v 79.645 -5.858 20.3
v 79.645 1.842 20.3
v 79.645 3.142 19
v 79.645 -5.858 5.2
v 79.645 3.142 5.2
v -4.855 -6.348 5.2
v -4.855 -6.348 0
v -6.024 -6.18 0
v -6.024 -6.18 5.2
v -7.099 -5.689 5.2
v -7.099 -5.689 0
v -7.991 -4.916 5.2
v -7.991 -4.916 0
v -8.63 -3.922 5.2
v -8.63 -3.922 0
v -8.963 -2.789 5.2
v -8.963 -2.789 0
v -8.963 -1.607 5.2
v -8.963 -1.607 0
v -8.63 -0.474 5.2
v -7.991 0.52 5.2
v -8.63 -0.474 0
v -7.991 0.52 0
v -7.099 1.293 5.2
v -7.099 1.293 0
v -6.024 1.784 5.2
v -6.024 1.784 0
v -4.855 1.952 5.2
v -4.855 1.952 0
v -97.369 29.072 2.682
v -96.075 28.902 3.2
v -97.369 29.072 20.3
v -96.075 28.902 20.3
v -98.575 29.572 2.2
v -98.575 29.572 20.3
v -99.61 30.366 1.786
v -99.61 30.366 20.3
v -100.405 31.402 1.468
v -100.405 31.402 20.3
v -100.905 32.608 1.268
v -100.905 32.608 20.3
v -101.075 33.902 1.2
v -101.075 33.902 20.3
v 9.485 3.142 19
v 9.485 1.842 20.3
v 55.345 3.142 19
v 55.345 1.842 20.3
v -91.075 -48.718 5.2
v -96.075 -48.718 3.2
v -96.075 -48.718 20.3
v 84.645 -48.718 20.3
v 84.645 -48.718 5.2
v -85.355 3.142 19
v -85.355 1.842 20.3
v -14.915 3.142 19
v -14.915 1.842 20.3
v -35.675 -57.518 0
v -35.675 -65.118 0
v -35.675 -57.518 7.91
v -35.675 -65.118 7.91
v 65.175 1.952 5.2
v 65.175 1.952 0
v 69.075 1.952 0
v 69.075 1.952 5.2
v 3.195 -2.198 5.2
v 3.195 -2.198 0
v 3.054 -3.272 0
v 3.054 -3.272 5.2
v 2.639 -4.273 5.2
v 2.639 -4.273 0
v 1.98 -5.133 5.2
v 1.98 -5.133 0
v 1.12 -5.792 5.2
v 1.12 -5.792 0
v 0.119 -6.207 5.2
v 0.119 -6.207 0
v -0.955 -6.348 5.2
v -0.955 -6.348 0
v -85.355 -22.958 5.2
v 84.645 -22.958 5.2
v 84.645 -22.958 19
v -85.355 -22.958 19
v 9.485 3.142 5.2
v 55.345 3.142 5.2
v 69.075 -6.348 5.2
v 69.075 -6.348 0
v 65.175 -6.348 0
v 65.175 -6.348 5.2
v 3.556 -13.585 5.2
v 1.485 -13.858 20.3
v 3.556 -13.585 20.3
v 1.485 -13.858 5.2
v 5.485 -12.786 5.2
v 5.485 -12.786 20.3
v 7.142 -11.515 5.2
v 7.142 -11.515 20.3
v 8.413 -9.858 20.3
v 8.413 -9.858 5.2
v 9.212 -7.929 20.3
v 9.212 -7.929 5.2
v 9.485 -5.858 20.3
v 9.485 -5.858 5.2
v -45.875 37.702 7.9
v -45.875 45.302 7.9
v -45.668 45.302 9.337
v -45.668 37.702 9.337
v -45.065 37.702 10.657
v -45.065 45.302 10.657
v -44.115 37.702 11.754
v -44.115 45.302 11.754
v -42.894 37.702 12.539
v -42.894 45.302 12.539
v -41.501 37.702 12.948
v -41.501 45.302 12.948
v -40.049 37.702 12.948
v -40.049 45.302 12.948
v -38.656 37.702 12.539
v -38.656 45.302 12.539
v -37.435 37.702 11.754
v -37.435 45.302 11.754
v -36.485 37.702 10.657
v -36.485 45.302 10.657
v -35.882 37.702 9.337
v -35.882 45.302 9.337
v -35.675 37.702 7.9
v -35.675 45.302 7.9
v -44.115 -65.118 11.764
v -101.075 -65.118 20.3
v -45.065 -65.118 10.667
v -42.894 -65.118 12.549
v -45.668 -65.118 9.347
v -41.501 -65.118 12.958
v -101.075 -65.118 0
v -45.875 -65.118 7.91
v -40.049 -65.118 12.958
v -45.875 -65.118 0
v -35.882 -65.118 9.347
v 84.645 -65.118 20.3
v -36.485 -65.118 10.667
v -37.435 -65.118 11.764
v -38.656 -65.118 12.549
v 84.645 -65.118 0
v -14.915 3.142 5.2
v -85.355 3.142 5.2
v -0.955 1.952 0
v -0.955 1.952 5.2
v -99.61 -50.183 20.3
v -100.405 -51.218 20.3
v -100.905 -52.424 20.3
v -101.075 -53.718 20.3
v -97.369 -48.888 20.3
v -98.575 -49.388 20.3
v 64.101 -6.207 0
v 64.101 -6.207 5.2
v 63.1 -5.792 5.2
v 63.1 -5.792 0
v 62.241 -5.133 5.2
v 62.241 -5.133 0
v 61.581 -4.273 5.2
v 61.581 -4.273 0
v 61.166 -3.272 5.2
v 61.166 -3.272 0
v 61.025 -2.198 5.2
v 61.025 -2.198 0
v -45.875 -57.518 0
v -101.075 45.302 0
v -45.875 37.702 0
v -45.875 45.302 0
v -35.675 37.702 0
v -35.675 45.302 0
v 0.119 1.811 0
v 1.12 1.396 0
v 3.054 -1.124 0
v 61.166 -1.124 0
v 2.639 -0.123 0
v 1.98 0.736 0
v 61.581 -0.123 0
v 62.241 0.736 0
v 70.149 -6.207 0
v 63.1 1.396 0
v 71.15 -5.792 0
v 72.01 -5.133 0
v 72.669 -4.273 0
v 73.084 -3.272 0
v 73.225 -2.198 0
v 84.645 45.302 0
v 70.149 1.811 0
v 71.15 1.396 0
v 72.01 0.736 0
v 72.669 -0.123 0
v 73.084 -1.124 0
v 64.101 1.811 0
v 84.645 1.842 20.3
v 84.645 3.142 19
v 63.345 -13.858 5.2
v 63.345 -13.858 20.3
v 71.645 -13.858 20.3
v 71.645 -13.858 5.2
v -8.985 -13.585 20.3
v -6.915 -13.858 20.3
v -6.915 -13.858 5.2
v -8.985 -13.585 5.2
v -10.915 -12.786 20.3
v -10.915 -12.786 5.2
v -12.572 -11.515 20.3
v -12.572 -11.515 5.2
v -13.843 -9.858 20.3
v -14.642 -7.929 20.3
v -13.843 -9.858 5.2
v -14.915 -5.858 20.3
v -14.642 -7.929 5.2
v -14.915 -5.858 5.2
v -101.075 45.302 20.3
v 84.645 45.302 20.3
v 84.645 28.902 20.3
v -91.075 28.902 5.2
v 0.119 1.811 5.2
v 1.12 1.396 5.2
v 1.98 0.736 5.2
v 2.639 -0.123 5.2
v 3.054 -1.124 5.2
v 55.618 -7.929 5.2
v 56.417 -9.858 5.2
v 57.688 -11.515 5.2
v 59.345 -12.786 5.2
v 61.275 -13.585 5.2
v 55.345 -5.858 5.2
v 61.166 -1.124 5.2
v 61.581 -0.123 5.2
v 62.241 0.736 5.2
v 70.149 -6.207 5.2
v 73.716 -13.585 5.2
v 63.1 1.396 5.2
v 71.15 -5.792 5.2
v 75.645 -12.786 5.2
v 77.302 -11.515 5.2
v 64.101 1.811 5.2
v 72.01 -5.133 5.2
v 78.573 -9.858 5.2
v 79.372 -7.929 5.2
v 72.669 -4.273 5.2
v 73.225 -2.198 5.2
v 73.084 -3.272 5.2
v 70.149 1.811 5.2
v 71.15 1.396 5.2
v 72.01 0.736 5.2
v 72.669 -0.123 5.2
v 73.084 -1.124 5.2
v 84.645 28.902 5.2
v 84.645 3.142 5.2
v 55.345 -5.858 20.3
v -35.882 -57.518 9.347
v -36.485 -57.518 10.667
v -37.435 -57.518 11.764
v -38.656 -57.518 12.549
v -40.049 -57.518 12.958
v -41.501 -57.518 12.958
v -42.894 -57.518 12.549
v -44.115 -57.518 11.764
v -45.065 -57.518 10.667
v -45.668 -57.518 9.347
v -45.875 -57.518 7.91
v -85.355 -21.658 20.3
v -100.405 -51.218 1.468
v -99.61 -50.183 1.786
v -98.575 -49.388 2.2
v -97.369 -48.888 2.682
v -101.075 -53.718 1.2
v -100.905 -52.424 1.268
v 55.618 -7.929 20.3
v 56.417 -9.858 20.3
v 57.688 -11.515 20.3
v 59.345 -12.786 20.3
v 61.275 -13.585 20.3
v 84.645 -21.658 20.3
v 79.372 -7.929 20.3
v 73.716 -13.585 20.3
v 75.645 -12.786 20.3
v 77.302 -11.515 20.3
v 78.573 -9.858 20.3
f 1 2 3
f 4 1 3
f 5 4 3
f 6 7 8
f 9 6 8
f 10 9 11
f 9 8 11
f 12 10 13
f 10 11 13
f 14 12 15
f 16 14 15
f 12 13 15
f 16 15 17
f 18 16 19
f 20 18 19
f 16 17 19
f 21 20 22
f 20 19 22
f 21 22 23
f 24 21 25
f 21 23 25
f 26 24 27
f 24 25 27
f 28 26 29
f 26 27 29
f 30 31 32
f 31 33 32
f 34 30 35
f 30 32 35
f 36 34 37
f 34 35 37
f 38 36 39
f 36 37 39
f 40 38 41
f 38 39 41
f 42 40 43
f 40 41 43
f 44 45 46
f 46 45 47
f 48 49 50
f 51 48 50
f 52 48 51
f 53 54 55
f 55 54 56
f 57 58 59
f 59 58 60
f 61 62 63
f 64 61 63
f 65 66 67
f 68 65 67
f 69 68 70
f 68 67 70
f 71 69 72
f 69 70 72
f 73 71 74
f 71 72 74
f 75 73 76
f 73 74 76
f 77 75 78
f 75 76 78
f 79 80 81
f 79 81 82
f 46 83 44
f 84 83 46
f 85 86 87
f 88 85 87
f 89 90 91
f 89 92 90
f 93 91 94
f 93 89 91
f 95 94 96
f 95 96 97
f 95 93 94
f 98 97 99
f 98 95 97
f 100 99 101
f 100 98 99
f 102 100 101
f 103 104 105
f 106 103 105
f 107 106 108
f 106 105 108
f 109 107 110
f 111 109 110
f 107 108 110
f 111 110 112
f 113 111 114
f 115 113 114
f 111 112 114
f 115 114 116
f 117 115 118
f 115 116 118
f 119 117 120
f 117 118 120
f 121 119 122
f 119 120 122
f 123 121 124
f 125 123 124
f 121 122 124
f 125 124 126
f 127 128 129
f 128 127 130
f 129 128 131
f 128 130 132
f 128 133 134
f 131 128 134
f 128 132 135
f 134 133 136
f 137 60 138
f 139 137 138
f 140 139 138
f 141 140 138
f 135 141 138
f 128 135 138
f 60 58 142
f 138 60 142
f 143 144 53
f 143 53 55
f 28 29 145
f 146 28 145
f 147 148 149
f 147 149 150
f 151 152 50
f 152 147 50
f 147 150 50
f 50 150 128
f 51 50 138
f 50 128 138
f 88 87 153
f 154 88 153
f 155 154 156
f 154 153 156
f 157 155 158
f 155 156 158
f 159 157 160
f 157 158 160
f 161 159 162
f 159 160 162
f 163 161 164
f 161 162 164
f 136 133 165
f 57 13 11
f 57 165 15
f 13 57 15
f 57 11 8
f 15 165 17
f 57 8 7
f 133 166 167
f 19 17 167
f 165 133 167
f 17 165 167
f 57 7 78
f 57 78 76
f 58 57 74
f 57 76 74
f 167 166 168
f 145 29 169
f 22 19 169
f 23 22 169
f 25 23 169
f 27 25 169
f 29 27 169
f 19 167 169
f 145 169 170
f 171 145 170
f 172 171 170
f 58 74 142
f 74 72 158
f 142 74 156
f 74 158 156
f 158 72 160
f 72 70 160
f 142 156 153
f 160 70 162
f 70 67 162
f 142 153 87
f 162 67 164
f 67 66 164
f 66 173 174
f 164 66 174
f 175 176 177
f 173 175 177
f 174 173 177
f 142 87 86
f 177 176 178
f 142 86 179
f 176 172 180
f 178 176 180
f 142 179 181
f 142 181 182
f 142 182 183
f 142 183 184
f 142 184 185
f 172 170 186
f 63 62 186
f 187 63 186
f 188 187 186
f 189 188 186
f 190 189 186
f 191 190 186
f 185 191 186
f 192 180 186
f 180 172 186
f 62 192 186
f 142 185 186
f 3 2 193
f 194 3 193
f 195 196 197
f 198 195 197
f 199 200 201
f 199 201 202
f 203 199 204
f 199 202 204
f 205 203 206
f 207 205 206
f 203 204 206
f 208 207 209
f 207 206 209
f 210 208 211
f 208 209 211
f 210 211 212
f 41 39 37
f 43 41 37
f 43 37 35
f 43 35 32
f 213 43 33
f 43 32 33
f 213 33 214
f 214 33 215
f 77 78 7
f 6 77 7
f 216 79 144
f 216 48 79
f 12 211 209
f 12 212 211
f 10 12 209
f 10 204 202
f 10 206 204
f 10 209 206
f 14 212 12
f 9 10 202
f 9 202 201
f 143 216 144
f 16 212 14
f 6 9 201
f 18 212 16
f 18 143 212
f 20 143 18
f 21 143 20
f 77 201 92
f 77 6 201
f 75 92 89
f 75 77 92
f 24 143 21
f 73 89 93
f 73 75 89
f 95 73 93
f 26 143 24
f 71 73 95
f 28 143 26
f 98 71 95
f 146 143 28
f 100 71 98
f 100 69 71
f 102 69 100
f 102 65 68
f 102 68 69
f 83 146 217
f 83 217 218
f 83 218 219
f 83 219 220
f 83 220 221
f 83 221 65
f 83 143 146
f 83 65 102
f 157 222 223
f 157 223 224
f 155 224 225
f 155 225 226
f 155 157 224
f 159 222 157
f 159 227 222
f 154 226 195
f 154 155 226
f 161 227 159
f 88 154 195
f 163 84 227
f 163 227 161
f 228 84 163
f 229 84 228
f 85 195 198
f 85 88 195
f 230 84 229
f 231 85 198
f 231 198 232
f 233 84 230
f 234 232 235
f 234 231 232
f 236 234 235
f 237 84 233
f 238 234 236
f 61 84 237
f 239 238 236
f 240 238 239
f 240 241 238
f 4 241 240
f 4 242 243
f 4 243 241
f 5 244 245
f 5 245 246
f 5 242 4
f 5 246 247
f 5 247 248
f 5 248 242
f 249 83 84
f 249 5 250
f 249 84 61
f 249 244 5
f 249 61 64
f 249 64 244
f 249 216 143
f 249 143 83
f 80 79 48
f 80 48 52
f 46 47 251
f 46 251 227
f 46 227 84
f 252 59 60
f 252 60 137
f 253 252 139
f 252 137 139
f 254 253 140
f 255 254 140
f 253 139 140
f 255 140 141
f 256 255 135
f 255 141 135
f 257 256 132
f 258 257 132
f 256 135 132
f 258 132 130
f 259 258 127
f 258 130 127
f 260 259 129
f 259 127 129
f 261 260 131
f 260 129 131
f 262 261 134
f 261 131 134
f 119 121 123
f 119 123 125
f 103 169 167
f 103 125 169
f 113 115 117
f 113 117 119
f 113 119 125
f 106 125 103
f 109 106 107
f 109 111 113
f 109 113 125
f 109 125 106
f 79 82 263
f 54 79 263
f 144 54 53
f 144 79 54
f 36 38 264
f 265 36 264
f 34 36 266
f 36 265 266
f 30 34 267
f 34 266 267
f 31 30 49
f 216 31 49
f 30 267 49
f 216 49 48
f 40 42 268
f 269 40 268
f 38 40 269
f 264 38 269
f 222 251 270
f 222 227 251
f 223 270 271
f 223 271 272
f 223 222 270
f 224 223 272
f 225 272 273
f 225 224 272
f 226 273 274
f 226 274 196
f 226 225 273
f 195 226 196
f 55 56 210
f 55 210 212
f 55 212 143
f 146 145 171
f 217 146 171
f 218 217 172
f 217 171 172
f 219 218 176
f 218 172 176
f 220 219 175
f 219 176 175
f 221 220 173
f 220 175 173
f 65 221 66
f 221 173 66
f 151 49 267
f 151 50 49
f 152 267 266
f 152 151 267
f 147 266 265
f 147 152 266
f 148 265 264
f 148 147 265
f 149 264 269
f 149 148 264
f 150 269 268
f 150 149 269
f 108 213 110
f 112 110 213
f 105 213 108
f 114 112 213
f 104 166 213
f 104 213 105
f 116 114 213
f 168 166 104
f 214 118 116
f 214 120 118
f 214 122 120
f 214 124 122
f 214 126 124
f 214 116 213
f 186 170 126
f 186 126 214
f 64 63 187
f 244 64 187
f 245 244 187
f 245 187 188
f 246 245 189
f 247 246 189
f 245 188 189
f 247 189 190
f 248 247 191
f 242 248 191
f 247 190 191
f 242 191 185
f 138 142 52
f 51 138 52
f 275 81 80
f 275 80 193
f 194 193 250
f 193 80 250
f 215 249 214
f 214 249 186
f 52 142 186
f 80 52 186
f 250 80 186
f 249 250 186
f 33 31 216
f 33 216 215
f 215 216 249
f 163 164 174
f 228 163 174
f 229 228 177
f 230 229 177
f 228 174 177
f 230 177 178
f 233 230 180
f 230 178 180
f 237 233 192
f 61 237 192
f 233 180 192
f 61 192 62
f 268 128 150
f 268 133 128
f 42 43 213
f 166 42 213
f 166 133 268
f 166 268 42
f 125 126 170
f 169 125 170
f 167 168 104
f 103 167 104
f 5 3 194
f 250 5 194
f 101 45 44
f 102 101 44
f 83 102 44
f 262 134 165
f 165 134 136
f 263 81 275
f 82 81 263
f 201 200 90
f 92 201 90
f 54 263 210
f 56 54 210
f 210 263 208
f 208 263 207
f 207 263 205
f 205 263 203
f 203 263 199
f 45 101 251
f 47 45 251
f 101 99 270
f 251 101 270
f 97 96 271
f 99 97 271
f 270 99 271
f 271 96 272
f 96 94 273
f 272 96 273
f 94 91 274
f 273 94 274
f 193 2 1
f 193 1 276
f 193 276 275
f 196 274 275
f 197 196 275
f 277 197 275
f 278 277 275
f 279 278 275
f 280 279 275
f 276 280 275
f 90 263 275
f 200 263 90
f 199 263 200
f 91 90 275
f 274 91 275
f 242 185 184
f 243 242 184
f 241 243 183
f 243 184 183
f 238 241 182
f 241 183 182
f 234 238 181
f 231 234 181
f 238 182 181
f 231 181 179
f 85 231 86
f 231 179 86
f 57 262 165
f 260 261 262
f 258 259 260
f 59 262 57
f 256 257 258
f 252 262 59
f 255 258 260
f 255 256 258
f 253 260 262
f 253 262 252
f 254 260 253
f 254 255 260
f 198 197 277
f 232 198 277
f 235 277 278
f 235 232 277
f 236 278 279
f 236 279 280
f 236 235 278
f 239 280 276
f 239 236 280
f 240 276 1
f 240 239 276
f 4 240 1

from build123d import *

# Parameters (mm, degrees)
F0_W      = 185.72
F0_H      = 110.42
F1_DEPTH  = 5.2
F3_DEPTH  = 110.42
F4_W      = 185.72
F4_H      = 16.4
F5_DEPTH  = 20.3
F6_W      = 24.4
F6_H      = 17
F6_W_2    = 24.3
F7_DEPTH  = 15.1
F8_R      = 8
F9_R      = 8
F10_R     = 5
F11_SIZE  = 1.3
F14_DEPTH = 7.6
F16_DEPTH = 7.6
F17_DEPTH = 20.301


with BuildPart() as f1:
    # F0 (on Top) → F1 (new body)
    with BuildSketch(Plane.XY):
        with Locations((-8.2149282098, -9.908063139)):
            Rectangle(F0_W, F0_H)
    extrude(amount=F1_DEPTH)

    # F2 (on face) → F3 (cut, through all)
    with BuildSketch(Plane.XZ.offset(65.118063139)):
        Polygon((-91.0749282098, 5.2), (-101.0749282098, 5.2), (-101.0749282098, 1.2), align=None)
    extrude(amount=-F3_DEPTH, mode=Mode.SUBTRACT)

    # F4 (on face) → F5 (join)
    with BuildSketch(Plane(origin=(0, 0, 0), x_dir=(1, 0, 0), z_dir=(0, 0, -1))):
        with Locations((-8.2149282098, 56.918063139)):
            Rectangle(F4_W, F4_H)
        with Locations((-8.2149282098, -37.101936861)):
            Rectangle(F4_W, F4_H)
        Polygon((84.6450717902, 9.908063139), (84.6450717902, 22.958063139), (-85.3549282098, 22.958063139), (-85.3549282098, 9.908063139), (-85.3549282098, -3.141936861), (84.6450717902, -3.141936861), align=None)
    extrude(amount=-F5_DEPTH)

    # F6 (on face) → F7 (cut)
    with BuildSketch(Plane.XY.offset(20.3)):
        with Locations((-2.7149282098, -5.358063139)):
            Rectangle(F6_W, F6_H)
        with Locations((67.4950717902, -5.358063139)):
            Rectangle(F6_W_2, F6_H)
    extrude(amount=-F7_DEPTH, mode=Mode.SUBTRACT)

    # F8
    f8_edges = [f1.edges().sort_by_distance(p)[0] for p in [
        (-14.914928, -13.858063, 12.75),
    ]]
    fillet(f8_edges, radius=F8_R)

    # F9
    f9_edges = [f1.edges().sort_by_distance(p)[0] for p in [
        (9.485072, -13.858063, 12.75),
        (79.645072, -13.858063, 12.75),
        (55.345072, -13.858063, 12.75),
    ]]
    fillet(f9_edges, radius=F9_R)

    # F10
    f10_edges = [f1.edges().sort_by_distance(p)[0] for p in [
        (-101.074928, 28.901937, 10.75),
        (-101.074928, -48.718063, 10.75),
    ]]
    fillet(f10_edges, radius=F10_R)

    # F11
    f11_edges = [f1.edges().sort_by_distance(p)[0] for p in [
        (-50.134928, 3.141937, 20.3),
        (32.415072, 3.141937, 20.3),
        (82.145072, 3.141937, 20.3),
        (-0.354928, -22.958063, 20.3),
    ]]
    chamfer(f11_edges, length=F11_SIZE)

    # F13 (on face) → F14 (cut)
    with BuildSketch(Plane.XZ.offset(65.118063139)):
        with BuildLine():
            Line((-45.8749282098, 7.9100113362), (-45.8749282098, 0))
            Line((-45.8749282098, 0), (-40.7749282098, 0))
            Line((-40.7749282098, 0), (-40.7749282098, 2.8100113362))
            ThreePointArc((-40.7749282098, 2.8100113362), (-44.3811727938, 4.3037667522), (-45.8749282098, 7.9100113362))
        make_face()
        with BuildLine():
            Line((-40.7749282098, 2.8100113362), (-40.7749282098, 0))
            Line((-40.7749282098, 0), (-35.6749282098, 0))
            Line((-35.6749282098, 0), (-35.6749282098, 7.9100113362))
            ThreePointArc((-35.6749282098, 7.9100113362), (-37.1686836257, 4.3037667522), (-40.7749282098, 2.8100113362))
        make_face()
        with BuildLine():
            Line((-40.7749282098, 7.9100113362), (-45.8749282098, 7.9100113362))
            ThreePointArc((-45.8749282098, 7.9100113362), (-44.3811727938, 4.3037667522), (-40.7749282098, 2.8100113362))
            Line((-40.7749282098, 2.8100113362), (-40.7749282098, 7.9100113362))
        make_face()
        with BuildLine():
            ThreePointArc((-35.6749282098, 7.9100113362), (-40.7749282098, 13.0100113362), (-45.8749282098, 7.9100113362))
            Line((-45.8749282098, 7.9100113362), (-40.7749282098, 7.9100113362))
            Line((-40.7749282098, 7.9100113362), (-35.6749282098, 7.9100113362))
        make_face()
        with BuildLine():
            Line((-40.7749282098, 7.9100113362), (-40.7749282098, 2.8100113362))
            ThreePointArc((-40.7749282098, 2.8100113362), (-37.1686836257, 4.3037667522), (-35.6749282098, 7.9100113362))
            Line((-35.6749282098, 7.9100113362), (-40.7749282098, 7.9100113362))
        make_face()
    extrude(amount=-F14_DEPTH, mode=Mode.SUBTRACT)

    # F15 (on face) → F16 (cut)
    with BuildSketch(Plane(origin=(0, 45.301936861, 0), x_dir=(-1, 0, 0), z_dir=(0, 1, 0))):
        with BuildLine():
            Line((40.7749282098, 0), (45.8749282098, 0))
            Line((45.8749282098, 0), (45.8749282098, 7.9))
            ThreePointArc((45.8749282098, 7.9), (44.3811727938, 4.2937554159), (40.7749282098, 2.8))
            Line((40.7749282098, 2.8), (40.7749282098, 0))
        make_face()
        with BuildLine():
            Line((35.6749282098, 0), (40.7749282098, 0))
            Line((40.7749282098, 0), (40.7749282098, 2.8))
            ThreePointArc((40.7749282098, 2.8), (37.1686836257, 4.2937554159), (35.6749282098, 7.9))
            Line((35.6749282098, 7.9), (35.6749282098, 0))
        make_face()
        with BuildLine():
            ThreePointArc((40.7749282098, 2.8), (44.3811727938, 4.2937554159), (45.8749282098, 7.9))
            Line((45.8749282098, 7.9), (40.7749282098, 7.9))
            Line((40.7749282098, 7.9), (40.7749282098, 2.8))
        make_face()
        with BuildLine():
            ThreePointArc((35.6749282098, 7.9), (37.1686836257, 4.2937554159), (40.7749282098, 2.8))
            Line((40.7749282098, 2.8), (40.7749282098, 7.9))
            Line((40.7749282098, 7.9), (35.6749282098, 7.9))
        make_face()
        with BuildLine():
            Line((40.7749282098, 7.9), (45.8749282098, 7.9))
            ThreePointArc((45.8749282098, 7.9), (40.7749282098, 13), (35.6749282098, 7.9))
            Line((35.6749282098, 7.9), (40.7749282098, 7.9))
        make_face()
    extrude(amount=-F16_DEPTH, mode=Mode.SUBTRACT)

    # F12 (on face) → F17 (cut, through all)
    with BuildSketch(Plane(origin=(0, 0, 0), x_dir=(1, 0, 0), z_dir=(0, 0, -1))):
        with BuildLine():
            ThreePointArc((-0.9549282098, -1.951936861), (1.9795649321, -0.7364300029), (3.1950717902, 2.198063139))
            Line((3.1950717902, 2.198063139), (-0.7049282098, 2.198063139))
            ThreePointArc((-0.7049282098, 2.198063139), (-1.2971901643, 0.0614770771), (-2.9049282098, -1.4652686778))
            ThreePointArc((-2.9049282098, -1.4652686778), (-1.9598344144, -1.8284320516), (-0.9549282098, -1.951936861))
        make_face()
        with BuildLine():
            Line((-0.7049282098, 2.198063139), (3.1950717902, 2.198063139))
            ThreePointArc((3.1950717902, 2.198063139), (1.9795649321, 5.132556281), (-0.9549282098, 6.348063139))
            ThreePointArc((-0.9549282098, 6.348063139), (-1.9598344144, 6.2245583296), (-2.9049282098, 5.8613949558))
            ThreePointArc((-2.9049282098, 5.8613949558), (-1.2971901643, 4.334649201), (-0.7049282098, 2.198063139))
        make_face()
        with BuildLine():
            ThreePointArc((69.0750717902, -1.951936861), (72.0095649321, -0.7364300029), (73.2250717902, 2.198063139))
            Line((73.2250717902, 2.198063139), (69.3250717902, 2.198063139))
            ThreePointArc((69.3250717902, 2.198063139), (68.7328098357, 0.0614770771), (67.1250717902, -1.4652686778))
            ThreePointArc((67.1250717902, -1.4652686778), (68.0701655856, -1.8284320516), (69.0750717902, -1.951936861))
        make_face()
        with BuildLine():
            Line((69.3250717902, 2.198063139), (73.2250717902, 2.198063139))
            ThreePointArc((73.2250717902, 2.198063139), (72.0095649321, 5.132556281), (69.0750717902, 6.348063139))
            ThreePointArc((69.0750717902, 6.348063139), (68.0701655856, 6.2245583296), (67.1250717902, 5.8613949558))
            ThreePointArc((67.1250717902, 5.8613949558), (68.7328098357, 4.334649201), (69.3250717902, 2.198063139))
        make_face()
        with BuildLine():
            ThreePointArc((67.1250717902, -1.4652686778), (68.7328098357, 0.0614770771), (69.3250717902, 2.198063139))
            Line((69.3250717902, 2.198063139), (69.0750717902, 2.198063139))
            Line((69.0750717902, 2.198063139), (65.1750717902, 2.198063139))
            Line((65.1750717902, 2.198063139), (64.9250717902, 2.198063139))
            ThreePointArc((64.9250717902, 2.198063139), (65.5173337448, 0.0614770771), (67.1250717902, -1.4652686778))
        make_face()
        with BuildLine():
            Line((69.0750717902, 2.198063139), (69.3250717902, 2.198063139))
            ThreePointArc((69.3250717902, 2.198063139), (68.7328098357, 4.334649201), (67.1250717902, 5.8613949558))
            ThreePointArc((67.1250717902, 5.8613949558), (65.5173337448, 4.334649201), (64.9250717902, 2.198063139))
            Line((64.9250717902, 2.198063139), (65.1750717902, 2.198063139))
            Line((65.1750717902, 2.198063139), (69.0750717902, 2.198063139))
        make_face()
        with BuildLine():
            ThreePointArc((67.1250717902, 5.8613949558), (68.0701655856, 6.2245583296), (69.0750717902, 6.348063139))
            Line((69.0750717902, 6.348063139), (65.1750717902, 6.348063139))
            ThreePointArc((65.1750717902, 6.348063139), (66.1799779949, 6.2245583296), (67.1250717902, 5.8613949558))
        make_face()
        with BuildLine():
            Line((65.1750717902, -1.951936861), (69.0750717902, -1.951936861))
            ThreePointArc((69.0750717902, -1.951936861), (68.0701655856, -1.8284320516), (67.1250717902, -1.4652686778))
            ThreePointArc((67.1250717902, -1.4652686778), (66.1799779949, -1.8284320516), (65.1750717902, -1.951936861))
        make_face()
        with BuildLine():
            ThreePointArc((64.9250717902, 2.198063139), (65.5173337448, 4.334649201), (67.1250717902, 5.8613949558))
            ThreePointArc((67.1250717902, 5.8613949558), (66.1799779949, 6.2245583296), (65.1750717902, 6.348063139))
            ThreePointArc((65.1750717902, 6.348063139), (62.2405786483, 5.132556281), (61.0250717902, 2.198063139))
            Line((61.0250717902, 2.198063139), (64.9250717902, 2.198063139))
        make_face()
        with BuildLine():
            ThreePointArc((65.1750717902, -1.951936861), (66.1799779949, -1.8284320516), (67.1250717902, -1.4652686778))
            ThreePointArc((67.1250717902, -1.4652686778), (65.5173337448, 0.0614770771), (64.9250717902, 2.198063139))
            Line((64.9250717902, 2.198063139), (61.0250717902, 2.198063139))
            ThreePointArc((61.0250717902, 2.198063139), (62.2405786483, -0.7364300029), (65.1750717902, -1.951936861))
        make_face()
        with BuildLine():
            ThreePointArc((-2.9049282098, -1.4652686778), (-1.2971901643, 0.0614770771), (-0.7049282098, 2.198063139))
            ThreePointArc((-0.7049282098, 2.198063139), (-1.2971901643, 4.334649201), (-2.9049282098, 5.8613949558))
            ThreePointArc((-2.9049282098, 5.8613949558), (-5.1049282098, 2.198063139), (-2.9049282098, -1.4652686778))
        make_face()
        with BuildLine():
            ThreePointArc((-2.9049282098, 5.8613949558), (-1.9598344144, 6.2245583296), (-0.9549282098, 6.348063139))
            Line((-0.9549282098, 6.348063139), (-4.8549282098, 6.348063139))
            ThreePointArc((-4.8549282098, 6.348063139), (-3.8500220051, 6.2245583296), (-2.9049282098, 5.8613949558))
        make_face()
        with BuildLine():
            Line((-4.8549282098, -1.951936861), (-0.9549282098, -1.951936861))
            ThreePointArc((-0.9549282098, -1.951936861), (-1.9598344144, -1.8284320516), (-2.9049282098, -1.4652686778))
            ThreePointArc((-2.9049282098, -1.4652686778), (-3.8500220051, -1.8284320516), (-4.8549282098, -1.951936861))
        make_face()
        with BuildLine():
            ThreePointArc((-2.9049282098, -1.4652686778), (-5.1049282098, 2.198063139), (-2.9049282098, 5.8613949558))
            ThreePointArc((-2.9049282098, 5.8613949558), (-3.8500220051, 6.2245583296), (-4.8549282098, 6.348063139))
            ThreePointArc((-4.8549282098, 6.348063139), (-9.0049282098, 2.198063139), (-4.8549282098, -1.951936861))
            ThreePointArc((-4.8549282098, -1.951936861), (-3.8500220051, -1.8284320516), (-2.9049282098, -1.4652686778))
        make_face()
    extrude(amount=-F17_DEPTH, mode=Mode.SUBTRACT)


solid = f1.part
